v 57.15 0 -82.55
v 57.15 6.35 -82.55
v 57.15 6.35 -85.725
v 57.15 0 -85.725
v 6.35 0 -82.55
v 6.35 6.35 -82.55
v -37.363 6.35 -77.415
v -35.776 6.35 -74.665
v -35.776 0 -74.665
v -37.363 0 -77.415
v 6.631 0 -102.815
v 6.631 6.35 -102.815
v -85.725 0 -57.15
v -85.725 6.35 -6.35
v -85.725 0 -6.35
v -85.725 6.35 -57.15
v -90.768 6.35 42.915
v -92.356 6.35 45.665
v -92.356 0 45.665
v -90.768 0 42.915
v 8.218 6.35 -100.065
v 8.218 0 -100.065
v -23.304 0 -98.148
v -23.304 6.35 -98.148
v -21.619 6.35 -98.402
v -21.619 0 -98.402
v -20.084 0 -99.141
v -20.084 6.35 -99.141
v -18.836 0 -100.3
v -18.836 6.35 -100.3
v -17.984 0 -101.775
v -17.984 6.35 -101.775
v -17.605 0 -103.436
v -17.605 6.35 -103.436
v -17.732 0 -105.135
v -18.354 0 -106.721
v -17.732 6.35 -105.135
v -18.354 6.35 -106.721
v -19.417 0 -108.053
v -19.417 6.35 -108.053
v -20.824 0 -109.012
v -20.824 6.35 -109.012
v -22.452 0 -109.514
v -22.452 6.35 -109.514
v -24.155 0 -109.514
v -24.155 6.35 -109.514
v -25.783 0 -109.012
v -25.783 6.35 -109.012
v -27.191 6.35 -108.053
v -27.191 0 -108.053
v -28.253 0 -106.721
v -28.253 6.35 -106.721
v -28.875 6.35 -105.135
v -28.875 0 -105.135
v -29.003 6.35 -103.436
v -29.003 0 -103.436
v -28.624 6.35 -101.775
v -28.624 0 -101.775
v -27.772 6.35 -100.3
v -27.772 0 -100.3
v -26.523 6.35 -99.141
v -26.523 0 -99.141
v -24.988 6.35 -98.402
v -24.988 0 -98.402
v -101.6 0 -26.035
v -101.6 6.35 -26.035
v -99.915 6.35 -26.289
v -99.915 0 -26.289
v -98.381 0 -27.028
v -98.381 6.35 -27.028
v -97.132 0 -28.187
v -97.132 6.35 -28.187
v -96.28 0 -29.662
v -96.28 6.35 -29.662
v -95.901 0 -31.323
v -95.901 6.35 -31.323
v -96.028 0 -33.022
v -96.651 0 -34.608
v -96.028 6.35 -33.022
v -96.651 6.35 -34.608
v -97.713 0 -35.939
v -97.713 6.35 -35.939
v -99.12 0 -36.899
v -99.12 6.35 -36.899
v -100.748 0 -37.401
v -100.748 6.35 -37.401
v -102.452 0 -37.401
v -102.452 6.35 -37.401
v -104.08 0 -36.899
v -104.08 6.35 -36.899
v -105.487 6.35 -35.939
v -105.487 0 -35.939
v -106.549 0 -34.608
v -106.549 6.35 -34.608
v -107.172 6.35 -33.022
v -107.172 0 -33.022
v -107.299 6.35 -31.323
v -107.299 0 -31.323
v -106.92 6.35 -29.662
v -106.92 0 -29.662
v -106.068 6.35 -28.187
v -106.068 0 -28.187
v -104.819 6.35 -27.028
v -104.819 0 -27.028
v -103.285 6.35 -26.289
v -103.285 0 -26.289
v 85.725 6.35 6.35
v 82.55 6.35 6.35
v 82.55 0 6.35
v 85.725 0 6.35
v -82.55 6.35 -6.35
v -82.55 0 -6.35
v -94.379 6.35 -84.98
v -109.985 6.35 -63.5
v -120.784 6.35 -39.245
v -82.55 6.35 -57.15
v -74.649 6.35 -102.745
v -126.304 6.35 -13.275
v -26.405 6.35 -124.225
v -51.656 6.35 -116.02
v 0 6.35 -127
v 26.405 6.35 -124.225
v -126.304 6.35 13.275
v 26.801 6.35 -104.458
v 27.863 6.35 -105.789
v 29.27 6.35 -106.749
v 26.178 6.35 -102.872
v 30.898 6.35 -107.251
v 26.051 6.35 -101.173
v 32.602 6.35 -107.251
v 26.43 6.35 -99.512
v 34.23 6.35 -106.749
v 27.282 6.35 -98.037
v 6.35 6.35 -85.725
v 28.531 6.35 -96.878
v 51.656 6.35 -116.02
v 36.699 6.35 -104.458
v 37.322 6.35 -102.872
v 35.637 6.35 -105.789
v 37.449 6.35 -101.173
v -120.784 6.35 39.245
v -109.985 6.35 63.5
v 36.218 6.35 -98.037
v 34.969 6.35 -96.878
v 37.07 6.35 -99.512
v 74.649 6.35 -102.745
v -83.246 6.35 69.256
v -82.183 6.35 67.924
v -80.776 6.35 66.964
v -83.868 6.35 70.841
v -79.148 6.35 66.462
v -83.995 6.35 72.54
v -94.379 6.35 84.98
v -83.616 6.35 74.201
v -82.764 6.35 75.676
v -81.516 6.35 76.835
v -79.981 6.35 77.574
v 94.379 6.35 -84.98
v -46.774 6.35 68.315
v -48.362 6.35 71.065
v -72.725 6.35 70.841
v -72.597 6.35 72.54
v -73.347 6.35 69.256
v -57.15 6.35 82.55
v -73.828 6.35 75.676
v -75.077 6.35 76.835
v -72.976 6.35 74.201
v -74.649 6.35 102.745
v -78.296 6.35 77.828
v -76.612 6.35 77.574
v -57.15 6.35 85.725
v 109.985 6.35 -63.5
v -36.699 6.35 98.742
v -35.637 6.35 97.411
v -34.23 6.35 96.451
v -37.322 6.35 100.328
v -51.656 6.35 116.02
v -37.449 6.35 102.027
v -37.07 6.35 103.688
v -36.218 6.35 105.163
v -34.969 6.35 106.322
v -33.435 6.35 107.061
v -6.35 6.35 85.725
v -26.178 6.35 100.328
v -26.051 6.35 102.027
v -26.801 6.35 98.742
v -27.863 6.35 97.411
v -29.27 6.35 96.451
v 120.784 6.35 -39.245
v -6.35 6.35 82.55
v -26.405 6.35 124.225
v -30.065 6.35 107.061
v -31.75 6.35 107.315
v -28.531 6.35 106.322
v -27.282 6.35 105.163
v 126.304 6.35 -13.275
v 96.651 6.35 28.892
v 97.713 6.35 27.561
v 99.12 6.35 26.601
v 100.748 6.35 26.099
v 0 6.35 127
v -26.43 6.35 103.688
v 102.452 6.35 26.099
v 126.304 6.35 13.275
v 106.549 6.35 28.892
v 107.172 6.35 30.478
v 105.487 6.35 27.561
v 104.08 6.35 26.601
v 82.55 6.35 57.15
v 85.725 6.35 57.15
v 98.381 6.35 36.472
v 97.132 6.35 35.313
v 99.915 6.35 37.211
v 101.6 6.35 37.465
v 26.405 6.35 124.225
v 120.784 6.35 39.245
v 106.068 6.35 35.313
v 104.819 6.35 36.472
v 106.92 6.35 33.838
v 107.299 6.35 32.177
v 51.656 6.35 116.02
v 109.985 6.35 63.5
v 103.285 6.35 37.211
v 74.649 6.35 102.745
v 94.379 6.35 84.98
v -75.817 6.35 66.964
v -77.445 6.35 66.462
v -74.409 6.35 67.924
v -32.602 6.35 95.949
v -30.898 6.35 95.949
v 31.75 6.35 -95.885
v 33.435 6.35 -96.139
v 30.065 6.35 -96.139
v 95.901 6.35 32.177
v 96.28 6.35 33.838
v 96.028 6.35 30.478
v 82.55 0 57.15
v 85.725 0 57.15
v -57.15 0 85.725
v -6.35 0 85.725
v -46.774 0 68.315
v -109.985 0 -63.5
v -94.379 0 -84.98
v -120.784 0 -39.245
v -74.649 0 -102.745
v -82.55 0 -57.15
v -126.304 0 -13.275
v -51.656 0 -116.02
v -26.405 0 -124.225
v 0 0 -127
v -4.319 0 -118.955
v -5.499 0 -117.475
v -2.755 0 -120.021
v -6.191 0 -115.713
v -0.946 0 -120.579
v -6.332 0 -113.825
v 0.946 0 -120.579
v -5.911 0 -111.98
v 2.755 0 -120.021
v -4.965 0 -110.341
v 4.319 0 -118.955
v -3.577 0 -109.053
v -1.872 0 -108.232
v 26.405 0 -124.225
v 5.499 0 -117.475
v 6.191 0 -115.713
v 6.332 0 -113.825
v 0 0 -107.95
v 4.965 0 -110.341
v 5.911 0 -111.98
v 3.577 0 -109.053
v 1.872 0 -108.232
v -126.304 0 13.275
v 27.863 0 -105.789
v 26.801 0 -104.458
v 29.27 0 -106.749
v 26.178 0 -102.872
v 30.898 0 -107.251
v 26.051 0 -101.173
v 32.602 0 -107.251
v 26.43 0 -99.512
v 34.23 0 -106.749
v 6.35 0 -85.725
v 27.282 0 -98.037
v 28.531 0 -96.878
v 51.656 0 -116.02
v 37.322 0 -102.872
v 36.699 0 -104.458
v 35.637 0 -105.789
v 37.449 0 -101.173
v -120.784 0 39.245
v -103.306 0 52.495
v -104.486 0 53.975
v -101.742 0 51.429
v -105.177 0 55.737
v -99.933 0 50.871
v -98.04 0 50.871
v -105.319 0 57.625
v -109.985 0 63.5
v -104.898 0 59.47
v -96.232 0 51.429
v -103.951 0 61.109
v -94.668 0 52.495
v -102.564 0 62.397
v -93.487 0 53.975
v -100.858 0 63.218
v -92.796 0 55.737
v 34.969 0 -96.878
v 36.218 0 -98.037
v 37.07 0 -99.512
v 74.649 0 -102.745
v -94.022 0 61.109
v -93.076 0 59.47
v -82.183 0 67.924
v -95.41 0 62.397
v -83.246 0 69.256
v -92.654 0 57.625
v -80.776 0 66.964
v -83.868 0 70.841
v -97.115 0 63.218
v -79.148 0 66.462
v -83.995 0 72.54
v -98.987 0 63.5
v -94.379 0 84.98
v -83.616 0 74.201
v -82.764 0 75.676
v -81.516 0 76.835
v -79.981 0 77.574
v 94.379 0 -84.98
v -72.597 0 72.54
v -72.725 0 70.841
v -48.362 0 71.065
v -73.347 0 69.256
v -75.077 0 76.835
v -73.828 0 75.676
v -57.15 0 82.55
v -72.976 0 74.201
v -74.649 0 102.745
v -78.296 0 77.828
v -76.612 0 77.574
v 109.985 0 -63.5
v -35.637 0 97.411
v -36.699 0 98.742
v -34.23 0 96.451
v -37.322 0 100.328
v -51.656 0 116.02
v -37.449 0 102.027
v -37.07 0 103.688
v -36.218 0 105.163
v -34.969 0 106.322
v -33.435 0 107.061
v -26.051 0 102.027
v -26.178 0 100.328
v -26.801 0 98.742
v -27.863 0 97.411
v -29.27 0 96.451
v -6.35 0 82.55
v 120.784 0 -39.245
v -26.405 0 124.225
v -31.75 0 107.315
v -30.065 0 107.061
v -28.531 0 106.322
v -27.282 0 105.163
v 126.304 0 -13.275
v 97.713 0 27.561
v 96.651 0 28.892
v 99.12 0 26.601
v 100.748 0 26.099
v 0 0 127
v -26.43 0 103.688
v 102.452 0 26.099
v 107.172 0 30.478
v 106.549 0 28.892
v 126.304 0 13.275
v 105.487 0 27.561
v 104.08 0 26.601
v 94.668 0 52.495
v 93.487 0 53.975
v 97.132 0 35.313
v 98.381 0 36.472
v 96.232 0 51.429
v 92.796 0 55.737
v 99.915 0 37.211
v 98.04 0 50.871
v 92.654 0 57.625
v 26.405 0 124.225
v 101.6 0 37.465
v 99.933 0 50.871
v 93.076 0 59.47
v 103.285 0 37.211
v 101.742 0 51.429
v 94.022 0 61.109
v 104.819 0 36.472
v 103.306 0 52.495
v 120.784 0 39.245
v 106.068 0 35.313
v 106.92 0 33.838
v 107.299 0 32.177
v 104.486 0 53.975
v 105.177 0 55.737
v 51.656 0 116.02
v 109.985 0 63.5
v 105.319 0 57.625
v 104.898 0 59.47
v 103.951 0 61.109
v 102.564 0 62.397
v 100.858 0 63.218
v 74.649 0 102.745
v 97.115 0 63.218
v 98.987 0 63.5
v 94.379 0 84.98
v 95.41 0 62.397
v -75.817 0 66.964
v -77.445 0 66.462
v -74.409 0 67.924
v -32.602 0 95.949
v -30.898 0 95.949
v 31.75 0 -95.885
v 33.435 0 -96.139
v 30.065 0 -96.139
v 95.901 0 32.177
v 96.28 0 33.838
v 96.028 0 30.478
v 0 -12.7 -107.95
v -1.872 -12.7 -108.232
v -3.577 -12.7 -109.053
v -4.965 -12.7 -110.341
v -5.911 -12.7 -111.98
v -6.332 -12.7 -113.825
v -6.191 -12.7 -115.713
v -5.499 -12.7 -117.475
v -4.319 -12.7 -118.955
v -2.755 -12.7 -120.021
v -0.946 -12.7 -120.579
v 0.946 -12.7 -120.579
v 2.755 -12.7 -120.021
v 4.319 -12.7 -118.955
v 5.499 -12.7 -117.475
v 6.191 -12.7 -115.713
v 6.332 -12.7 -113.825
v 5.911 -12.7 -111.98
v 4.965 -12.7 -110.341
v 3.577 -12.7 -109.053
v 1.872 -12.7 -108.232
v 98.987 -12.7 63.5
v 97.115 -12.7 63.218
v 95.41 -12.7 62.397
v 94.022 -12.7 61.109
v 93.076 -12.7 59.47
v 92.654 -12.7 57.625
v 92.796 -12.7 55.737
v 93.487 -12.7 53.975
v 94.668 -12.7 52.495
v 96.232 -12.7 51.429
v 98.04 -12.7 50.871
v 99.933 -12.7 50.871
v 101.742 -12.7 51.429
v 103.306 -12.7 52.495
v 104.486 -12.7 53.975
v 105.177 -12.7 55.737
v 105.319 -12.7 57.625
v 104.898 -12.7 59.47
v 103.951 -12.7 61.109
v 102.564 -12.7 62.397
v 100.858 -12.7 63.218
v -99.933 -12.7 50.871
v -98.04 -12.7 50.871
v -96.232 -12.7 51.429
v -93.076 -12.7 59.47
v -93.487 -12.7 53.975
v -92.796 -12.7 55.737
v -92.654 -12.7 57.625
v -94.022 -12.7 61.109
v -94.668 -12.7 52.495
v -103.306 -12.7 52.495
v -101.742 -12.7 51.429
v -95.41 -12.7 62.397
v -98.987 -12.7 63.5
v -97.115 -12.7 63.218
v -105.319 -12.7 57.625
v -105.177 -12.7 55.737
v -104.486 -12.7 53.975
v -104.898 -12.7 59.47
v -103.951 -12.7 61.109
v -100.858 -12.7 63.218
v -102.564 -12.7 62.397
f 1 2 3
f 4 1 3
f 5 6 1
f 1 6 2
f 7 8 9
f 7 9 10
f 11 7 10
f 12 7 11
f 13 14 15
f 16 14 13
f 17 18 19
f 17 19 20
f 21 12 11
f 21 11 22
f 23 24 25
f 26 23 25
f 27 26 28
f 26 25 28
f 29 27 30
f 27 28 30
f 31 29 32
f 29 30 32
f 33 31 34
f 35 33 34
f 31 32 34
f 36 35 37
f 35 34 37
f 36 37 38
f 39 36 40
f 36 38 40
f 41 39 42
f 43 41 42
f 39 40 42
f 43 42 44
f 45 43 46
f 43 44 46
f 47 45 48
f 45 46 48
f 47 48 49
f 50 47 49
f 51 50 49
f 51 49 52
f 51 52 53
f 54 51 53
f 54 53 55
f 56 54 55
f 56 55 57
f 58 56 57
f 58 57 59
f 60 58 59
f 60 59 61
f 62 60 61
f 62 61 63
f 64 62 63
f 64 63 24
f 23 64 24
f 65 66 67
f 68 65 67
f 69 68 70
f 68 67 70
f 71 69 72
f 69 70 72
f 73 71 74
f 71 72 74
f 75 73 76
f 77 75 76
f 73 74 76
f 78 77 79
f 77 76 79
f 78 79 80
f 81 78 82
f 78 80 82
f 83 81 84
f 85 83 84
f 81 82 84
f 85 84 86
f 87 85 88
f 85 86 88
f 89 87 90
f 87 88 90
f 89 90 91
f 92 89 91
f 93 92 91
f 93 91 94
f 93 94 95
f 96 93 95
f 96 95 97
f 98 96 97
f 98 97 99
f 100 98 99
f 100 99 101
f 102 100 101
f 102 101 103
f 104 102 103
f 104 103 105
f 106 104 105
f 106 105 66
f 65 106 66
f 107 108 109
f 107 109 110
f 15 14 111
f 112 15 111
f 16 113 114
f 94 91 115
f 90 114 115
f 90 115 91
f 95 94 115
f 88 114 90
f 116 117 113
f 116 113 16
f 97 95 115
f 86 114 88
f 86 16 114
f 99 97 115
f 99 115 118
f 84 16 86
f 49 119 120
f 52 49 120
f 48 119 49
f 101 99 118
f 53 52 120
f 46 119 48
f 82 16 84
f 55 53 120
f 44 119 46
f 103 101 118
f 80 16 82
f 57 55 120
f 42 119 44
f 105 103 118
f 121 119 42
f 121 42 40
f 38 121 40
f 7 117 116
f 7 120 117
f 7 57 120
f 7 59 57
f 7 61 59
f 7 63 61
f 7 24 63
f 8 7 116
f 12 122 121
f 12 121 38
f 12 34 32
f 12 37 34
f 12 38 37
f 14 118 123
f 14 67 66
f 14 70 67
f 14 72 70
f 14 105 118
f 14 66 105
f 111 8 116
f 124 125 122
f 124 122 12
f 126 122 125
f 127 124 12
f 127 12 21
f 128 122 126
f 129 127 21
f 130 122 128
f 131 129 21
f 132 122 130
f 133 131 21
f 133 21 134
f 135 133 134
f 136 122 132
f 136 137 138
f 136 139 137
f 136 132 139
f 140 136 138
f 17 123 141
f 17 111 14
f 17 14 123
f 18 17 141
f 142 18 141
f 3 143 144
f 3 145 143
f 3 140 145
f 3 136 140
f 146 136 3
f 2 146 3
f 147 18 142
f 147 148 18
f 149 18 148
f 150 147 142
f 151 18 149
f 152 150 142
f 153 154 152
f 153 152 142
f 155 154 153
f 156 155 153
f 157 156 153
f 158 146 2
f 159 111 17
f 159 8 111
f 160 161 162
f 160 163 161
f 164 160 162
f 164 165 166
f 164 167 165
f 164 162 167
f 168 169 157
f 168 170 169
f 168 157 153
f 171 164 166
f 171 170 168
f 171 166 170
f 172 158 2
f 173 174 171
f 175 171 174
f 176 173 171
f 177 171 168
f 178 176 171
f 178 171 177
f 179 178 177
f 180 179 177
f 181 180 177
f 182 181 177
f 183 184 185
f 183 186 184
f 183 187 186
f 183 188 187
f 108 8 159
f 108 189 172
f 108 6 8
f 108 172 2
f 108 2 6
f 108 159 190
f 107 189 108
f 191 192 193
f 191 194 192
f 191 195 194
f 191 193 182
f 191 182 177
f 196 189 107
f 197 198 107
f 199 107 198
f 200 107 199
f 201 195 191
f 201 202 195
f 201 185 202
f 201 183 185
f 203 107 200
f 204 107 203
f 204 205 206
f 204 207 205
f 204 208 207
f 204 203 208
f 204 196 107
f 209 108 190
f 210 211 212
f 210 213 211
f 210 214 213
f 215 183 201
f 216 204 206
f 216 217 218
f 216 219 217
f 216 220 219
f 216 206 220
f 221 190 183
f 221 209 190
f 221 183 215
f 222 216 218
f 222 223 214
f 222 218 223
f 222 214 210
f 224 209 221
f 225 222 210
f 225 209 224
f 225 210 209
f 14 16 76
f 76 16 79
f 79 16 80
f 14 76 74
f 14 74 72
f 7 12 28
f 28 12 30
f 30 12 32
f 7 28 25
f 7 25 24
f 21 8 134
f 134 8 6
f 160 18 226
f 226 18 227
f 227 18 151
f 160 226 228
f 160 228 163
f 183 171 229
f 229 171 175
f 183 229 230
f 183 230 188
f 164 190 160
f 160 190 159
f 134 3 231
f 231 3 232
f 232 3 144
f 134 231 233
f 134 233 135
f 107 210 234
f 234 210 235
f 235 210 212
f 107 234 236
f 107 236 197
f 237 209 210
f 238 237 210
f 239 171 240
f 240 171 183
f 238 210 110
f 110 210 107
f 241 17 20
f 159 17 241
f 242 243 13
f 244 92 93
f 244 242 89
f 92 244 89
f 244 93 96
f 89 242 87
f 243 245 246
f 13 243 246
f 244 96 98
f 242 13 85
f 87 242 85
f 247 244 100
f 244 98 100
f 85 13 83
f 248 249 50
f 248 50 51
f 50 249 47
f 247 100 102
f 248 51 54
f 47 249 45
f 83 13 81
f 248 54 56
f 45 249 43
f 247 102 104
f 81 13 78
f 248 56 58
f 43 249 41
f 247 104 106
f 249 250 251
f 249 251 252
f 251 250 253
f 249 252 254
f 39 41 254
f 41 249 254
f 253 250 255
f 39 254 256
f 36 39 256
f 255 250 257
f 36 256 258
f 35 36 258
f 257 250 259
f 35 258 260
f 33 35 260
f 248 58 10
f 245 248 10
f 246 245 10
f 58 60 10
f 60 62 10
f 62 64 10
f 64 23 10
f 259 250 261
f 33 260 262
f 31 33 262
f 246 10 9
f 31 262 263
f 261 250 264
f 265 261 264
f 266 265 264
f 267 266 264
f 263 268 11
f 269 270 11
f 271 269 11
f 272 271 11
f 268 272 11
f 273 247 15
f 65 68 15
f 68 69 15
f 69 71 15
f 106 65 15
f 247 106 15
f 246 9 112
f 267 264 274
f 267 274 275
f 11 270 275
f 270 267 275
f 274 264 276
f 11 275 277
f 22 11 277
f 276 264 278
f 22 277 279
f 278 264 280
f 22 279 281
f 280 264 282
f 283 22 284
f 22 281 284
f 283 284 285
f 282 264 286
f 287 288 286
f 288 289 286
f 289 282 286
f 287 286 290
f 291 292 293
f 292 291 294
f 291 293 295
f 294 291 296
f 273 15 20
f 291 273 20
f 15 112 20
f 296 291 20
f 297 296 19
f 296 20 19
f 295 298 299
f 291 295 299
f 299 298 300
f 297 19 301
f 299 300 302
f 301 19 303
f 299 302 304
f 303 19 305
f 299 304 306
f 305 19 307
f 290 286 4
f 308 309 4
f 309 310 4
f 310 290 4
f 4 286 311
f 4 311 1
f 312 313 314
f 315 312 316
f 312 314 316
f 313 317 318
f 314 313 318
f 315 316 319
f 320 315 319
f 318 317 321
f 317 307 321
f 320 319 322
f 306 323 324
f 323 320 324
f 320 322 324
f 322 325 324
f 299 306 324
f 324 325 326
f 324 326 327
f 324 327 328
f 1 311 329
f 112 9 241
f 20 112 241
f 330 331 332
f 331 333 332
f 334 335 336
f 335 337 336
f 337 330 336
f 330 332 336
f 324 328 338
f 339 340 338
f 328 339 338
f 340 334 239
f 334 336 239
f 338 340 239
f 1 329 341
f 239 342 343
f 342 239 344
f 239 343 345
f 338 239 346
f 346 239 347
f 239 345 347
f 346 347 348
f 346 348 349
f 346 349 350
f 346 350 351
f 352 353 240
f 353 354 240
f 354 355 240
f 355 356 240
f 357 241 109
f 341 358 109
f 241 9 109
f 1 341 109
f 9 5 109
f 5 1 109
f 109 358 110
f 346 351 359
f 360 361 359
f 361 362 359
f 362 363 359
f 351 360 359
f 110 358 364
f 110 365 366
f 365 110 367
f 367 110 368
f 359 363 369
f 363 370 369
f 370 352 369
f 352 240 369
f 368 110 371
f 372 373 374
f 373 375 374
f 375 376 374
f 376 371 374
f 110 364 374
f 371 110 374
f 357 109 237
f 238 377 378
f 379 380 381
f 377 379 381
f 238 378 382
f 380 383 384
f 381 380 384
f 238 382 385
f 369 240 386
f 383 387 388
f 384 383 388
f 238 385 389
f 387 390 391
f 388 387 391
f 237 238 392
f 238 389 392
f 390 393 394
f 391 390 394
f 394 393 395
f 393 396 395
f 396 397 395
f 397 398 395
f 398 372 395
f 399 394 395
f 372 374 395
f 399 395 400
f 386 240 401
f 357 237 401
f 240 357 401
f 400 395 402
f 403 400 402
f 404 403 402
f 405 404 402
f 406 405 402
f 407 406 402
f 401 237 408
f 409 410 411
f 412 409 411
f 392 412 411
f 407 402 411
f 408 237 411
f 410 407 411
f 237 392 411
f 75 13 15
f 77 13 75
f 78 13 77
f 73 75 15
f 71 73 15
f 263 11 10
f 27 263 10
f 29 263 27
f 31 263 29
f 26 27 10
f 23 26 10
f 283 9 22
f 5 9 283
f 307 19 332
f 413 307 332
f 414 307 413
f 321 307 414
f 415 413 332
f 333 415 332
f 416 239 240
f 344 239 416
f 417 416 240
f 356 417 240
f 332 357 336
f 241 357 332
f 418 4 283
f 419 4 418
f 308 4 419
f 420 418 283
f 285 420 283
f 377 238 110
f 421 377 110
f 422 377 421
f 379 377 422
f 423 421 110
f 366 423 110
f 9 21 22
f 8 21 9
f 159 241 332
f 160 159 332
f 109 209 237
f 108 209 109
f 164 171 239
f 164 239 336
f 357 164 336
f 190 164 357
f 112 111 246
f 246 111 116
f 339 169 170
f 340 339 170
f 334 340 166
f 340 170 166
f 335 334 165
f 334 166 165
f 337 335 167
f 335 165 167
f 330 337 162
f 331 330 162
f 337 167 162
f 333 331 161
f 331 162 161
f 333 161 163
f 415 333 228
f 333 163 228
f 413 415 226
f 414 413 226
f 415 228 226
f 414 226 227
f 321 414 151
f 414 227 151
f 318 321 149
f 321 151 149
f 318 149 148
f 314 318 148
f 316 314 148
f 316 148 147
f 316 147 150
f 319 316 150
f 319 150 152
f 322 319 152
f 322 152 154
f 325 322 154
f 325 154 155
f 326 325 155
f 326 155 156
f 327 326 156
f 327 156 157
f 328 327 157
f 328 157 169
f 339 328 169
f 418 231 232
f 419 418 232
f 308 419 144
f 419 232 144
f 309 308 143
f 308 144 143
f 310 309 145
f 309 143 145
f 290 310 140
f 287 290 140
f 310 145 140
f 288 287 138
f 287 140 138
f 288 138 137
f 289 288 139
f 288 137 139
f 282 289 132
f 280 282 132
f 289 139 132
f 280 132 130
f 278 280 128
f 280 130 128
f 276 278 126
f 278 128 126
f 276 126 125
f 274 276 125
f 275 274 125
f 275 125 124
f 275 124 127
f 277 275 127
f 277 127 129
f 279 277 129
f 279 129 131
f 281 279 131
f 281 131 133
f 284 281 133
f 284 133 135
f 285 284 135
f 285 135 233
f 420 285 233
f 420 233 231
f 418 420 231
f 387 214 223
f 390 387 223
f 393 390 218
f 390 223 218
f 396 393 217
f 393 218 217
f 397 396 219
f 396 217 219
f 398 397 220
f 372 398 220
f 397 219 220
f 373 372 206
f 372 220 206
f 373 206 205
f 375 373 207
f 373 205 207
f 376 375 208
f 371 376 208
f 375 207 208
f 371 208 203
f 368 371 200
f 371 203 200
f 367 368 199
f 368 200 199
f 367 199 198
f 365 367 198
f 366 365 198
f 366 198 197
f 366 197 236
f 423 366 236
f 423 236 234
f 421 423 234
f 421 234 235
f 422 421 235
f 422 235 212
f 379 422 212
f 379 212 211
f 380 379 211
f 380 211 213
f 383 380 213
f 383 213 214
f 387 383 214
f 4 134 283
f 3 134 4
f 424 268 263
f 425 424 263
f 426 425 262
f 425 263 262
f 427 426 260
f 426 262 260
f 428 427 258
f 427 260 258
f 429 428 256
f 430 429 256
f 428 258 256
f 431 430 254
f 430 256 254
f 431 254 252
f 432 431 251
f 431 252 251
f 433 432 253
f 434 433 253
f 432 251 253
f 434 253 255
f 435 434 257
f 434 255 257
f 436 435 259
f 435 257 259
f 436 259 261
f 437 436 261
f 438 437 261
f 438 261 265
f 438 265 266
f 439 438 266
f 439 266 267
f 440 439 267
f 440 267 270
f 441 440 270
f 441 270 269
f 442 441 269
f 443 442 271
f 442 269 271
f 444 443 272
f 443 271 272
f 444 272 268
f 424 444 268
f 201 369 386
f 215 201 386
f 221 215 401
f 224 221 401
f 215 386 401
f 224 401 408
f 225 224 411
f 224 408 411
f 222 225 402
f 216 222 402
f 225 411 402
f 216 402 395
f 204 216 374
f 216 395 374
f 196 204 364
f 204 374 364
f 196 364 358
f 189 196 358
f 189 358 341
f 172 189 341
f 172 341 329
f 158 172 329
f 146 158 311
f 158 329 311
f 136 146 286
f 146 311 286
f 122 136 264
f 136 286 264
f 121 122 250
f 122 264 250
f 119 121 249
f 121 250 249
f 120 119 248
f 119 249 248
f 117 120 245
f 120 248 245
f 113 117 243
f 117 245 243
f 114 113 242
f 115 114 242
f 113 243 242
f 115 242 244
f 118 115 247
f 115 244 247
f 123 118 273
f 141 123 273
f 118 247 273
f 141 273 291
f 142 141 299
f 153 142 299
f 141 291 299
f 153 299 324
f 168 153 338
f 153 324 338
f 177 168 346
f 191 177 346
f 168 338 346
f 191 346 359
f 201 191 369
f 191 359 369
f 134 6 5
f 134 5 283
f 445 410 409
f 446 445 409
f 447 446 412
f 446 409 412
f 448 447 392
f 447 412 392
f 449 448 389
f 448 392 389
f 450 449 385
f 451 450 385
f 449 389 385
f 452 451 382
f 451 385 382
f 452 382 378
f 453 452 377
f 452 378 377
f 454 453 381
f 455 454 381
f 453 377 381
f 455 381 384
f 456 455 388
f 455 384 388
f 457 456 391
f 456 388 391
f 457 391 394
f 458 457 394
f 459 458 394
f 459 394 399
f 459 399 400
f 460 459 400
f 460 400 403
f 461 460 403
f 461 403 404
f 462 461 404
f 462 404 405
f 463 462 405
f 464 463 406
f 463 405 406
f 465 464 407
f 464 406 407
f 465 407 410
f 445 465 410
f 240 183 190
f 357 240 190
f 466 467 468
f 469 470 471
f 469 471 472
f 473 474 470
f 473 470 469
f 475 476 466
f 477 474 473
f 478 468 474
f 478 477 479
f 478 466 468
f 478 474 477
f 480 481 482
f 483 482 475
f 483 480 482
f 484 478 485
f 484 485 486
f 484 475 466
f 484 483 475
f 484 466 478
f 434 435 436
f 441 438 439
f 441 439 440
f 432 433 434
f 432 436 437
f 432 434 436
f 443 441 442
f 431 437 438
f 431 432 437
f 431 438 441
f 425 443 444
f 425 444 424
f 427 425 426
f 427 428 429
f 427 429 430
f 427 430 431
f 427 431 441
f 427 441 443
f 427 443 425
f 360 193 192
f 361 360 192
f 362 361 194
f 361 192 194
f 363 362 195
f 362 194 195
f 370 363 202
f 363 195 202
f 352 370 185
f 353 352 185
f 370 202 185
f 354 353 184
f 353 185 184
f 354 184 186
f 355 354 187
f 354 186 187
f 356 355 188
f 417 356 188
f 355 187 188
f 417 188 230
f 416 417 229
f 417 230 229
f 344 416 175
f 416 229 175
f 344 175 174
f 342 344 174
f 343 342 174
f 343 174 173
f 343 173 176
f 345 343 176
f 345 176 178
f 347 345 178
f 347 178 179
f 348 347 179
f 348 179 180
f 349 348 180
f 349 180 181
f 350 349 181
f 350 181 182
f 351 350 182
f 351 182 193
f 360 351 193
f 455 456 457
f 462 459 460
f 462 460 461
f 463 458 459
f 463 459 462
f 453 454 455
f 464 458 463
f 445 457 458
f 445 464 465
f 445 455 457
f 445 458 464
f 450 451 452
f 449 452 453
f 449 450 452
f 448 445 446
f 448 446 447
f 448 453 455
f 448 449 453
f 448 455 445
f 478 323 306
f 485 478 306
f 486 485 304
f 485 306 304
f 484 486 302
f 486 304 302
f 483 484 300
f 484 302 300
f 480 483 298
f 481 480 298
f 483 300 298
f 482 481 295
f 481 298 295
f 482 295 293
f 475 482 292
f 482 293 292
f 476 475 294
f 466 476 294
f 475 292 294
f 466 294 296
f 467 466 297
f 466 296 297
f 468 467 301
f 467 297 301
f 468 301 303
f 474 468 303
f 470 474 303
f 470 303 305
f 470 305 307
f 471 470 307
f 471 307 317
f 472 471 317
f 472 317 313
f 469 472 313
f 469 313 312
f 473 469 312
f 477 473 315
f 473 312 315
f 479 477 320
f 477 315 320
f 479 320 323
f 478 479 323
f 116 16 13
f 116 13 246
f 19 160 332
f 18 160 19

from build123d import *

# Parameters (mm, degrees)
SKETCH1_R           = 127
BOSS_EXTRUDE1_DEPTH = 6.35
SKETCH2_R           = 6.35
BOSS_EXTRUDE2_DEPTH = 12.7
SKETCH3_R           = 5.715
SKETCH3_W           = 50.8
SKETCH3_H           = 3.175
SKETCH3_W_2         = 3.175
SKETCH3_H_2         = 50.8
CUT_EXTRUDE1_DEPTH  = 181.612575697


with BuildPart() as part:
    # Sketch1 → Boss-Extrude1 (new body)
    with BuildSketch(Plane(origin=(0, 0, 0), x_dir=(1, 0, 0), z_dir=(0, 1, 0))):
        with Locations(Location((0, 0, 0), (0, 0, 270))):
            Circle(SKETCH1_R)
    extrude(amount=BOSS_EXTRUDE1_DEPTH)

    # Sketch2 → Boss-Extrude2 (add)
    with BuildSketch(Plane.XZ):
        with Locations(Location((0, -114.3, 0), (0, 0, 90))):
            Circle(SKETCH2_R)
        with Locations(Location((-98.986703653, 57.15, 0), (0, 0, 90))):
            Circle(SKETCH2_R)
        with Locations(Location((98.986703653, 57.15, 0), (0, 0, 90))):
            Circle(SKETCH2_R)
    extrude(amount=BOSS_EXTRUDE2_DEPTH)

    # Sketch3 → Cut-Extrude1 (cut, through all)
    with BuildSketch(Plane(origin=(0, 6.35, 0), x_dir=(1, 0, 0), z_dir=(0, 1, 0))):
        with Locations(Location((101.6, -31.75, 0), (0, 0, 270))):
            Circle(SKETCH3_R)
        with Locations(Location((-31.75, -101.6, 0), (0, 0, 270))):
            Circle(SKETCH3_R)
        with Locations(Location((-101.6, 31.75, 0), (0, 0, 270))):
            Circle(SKETCH3_R)
        with Locations(Location((31.75, 101.6, 0), (0, 0, 270))):
            Circle(SKETCH3_R)
        with Locations(Location((-78.29630657, -72.113181024, 0), (0, 0, 270))):
            Circle(SKETCH3_R)
        with Locations(Location((-23.30369343, 103.863181024, 0), (0, 0, 270))):
            Circle(SKETCH3_R)
        with Locations((-31.75, -84.1375)):
            Rectangle(SKETCH3_W, SKETCH3_H)
        with Locations((84.1375, -31.75)):
            Rectangle(SKETCH3_W_2, SKETCH3_H_2)
        with Locations((-84.1375, 31.75)):
            Rectangle(SKETCH3_W_2, SKETCH3_H_2)
        with Locations((31.75, 84.1375)):
            Rectangle(SKETCH3_W, SKETCH3_H)
        Polygon((-48.361761314, -71.065027739), (-92.355851826, -45.665027739), (-90.768351826, -42.915397082), (-46.774261314, -68.315397082), align=None)
        Polygon((-37.363238686, 77.415027739), (6.630851826, 102.815027739), (8.218351826, 100.065397082), (-35.775738686, 74.665397082), align=None)
    extrude(amount=-CUT_EXTRUDE1_DEPTH, mode=Mode.SUBTRACT)


solid = part.part
